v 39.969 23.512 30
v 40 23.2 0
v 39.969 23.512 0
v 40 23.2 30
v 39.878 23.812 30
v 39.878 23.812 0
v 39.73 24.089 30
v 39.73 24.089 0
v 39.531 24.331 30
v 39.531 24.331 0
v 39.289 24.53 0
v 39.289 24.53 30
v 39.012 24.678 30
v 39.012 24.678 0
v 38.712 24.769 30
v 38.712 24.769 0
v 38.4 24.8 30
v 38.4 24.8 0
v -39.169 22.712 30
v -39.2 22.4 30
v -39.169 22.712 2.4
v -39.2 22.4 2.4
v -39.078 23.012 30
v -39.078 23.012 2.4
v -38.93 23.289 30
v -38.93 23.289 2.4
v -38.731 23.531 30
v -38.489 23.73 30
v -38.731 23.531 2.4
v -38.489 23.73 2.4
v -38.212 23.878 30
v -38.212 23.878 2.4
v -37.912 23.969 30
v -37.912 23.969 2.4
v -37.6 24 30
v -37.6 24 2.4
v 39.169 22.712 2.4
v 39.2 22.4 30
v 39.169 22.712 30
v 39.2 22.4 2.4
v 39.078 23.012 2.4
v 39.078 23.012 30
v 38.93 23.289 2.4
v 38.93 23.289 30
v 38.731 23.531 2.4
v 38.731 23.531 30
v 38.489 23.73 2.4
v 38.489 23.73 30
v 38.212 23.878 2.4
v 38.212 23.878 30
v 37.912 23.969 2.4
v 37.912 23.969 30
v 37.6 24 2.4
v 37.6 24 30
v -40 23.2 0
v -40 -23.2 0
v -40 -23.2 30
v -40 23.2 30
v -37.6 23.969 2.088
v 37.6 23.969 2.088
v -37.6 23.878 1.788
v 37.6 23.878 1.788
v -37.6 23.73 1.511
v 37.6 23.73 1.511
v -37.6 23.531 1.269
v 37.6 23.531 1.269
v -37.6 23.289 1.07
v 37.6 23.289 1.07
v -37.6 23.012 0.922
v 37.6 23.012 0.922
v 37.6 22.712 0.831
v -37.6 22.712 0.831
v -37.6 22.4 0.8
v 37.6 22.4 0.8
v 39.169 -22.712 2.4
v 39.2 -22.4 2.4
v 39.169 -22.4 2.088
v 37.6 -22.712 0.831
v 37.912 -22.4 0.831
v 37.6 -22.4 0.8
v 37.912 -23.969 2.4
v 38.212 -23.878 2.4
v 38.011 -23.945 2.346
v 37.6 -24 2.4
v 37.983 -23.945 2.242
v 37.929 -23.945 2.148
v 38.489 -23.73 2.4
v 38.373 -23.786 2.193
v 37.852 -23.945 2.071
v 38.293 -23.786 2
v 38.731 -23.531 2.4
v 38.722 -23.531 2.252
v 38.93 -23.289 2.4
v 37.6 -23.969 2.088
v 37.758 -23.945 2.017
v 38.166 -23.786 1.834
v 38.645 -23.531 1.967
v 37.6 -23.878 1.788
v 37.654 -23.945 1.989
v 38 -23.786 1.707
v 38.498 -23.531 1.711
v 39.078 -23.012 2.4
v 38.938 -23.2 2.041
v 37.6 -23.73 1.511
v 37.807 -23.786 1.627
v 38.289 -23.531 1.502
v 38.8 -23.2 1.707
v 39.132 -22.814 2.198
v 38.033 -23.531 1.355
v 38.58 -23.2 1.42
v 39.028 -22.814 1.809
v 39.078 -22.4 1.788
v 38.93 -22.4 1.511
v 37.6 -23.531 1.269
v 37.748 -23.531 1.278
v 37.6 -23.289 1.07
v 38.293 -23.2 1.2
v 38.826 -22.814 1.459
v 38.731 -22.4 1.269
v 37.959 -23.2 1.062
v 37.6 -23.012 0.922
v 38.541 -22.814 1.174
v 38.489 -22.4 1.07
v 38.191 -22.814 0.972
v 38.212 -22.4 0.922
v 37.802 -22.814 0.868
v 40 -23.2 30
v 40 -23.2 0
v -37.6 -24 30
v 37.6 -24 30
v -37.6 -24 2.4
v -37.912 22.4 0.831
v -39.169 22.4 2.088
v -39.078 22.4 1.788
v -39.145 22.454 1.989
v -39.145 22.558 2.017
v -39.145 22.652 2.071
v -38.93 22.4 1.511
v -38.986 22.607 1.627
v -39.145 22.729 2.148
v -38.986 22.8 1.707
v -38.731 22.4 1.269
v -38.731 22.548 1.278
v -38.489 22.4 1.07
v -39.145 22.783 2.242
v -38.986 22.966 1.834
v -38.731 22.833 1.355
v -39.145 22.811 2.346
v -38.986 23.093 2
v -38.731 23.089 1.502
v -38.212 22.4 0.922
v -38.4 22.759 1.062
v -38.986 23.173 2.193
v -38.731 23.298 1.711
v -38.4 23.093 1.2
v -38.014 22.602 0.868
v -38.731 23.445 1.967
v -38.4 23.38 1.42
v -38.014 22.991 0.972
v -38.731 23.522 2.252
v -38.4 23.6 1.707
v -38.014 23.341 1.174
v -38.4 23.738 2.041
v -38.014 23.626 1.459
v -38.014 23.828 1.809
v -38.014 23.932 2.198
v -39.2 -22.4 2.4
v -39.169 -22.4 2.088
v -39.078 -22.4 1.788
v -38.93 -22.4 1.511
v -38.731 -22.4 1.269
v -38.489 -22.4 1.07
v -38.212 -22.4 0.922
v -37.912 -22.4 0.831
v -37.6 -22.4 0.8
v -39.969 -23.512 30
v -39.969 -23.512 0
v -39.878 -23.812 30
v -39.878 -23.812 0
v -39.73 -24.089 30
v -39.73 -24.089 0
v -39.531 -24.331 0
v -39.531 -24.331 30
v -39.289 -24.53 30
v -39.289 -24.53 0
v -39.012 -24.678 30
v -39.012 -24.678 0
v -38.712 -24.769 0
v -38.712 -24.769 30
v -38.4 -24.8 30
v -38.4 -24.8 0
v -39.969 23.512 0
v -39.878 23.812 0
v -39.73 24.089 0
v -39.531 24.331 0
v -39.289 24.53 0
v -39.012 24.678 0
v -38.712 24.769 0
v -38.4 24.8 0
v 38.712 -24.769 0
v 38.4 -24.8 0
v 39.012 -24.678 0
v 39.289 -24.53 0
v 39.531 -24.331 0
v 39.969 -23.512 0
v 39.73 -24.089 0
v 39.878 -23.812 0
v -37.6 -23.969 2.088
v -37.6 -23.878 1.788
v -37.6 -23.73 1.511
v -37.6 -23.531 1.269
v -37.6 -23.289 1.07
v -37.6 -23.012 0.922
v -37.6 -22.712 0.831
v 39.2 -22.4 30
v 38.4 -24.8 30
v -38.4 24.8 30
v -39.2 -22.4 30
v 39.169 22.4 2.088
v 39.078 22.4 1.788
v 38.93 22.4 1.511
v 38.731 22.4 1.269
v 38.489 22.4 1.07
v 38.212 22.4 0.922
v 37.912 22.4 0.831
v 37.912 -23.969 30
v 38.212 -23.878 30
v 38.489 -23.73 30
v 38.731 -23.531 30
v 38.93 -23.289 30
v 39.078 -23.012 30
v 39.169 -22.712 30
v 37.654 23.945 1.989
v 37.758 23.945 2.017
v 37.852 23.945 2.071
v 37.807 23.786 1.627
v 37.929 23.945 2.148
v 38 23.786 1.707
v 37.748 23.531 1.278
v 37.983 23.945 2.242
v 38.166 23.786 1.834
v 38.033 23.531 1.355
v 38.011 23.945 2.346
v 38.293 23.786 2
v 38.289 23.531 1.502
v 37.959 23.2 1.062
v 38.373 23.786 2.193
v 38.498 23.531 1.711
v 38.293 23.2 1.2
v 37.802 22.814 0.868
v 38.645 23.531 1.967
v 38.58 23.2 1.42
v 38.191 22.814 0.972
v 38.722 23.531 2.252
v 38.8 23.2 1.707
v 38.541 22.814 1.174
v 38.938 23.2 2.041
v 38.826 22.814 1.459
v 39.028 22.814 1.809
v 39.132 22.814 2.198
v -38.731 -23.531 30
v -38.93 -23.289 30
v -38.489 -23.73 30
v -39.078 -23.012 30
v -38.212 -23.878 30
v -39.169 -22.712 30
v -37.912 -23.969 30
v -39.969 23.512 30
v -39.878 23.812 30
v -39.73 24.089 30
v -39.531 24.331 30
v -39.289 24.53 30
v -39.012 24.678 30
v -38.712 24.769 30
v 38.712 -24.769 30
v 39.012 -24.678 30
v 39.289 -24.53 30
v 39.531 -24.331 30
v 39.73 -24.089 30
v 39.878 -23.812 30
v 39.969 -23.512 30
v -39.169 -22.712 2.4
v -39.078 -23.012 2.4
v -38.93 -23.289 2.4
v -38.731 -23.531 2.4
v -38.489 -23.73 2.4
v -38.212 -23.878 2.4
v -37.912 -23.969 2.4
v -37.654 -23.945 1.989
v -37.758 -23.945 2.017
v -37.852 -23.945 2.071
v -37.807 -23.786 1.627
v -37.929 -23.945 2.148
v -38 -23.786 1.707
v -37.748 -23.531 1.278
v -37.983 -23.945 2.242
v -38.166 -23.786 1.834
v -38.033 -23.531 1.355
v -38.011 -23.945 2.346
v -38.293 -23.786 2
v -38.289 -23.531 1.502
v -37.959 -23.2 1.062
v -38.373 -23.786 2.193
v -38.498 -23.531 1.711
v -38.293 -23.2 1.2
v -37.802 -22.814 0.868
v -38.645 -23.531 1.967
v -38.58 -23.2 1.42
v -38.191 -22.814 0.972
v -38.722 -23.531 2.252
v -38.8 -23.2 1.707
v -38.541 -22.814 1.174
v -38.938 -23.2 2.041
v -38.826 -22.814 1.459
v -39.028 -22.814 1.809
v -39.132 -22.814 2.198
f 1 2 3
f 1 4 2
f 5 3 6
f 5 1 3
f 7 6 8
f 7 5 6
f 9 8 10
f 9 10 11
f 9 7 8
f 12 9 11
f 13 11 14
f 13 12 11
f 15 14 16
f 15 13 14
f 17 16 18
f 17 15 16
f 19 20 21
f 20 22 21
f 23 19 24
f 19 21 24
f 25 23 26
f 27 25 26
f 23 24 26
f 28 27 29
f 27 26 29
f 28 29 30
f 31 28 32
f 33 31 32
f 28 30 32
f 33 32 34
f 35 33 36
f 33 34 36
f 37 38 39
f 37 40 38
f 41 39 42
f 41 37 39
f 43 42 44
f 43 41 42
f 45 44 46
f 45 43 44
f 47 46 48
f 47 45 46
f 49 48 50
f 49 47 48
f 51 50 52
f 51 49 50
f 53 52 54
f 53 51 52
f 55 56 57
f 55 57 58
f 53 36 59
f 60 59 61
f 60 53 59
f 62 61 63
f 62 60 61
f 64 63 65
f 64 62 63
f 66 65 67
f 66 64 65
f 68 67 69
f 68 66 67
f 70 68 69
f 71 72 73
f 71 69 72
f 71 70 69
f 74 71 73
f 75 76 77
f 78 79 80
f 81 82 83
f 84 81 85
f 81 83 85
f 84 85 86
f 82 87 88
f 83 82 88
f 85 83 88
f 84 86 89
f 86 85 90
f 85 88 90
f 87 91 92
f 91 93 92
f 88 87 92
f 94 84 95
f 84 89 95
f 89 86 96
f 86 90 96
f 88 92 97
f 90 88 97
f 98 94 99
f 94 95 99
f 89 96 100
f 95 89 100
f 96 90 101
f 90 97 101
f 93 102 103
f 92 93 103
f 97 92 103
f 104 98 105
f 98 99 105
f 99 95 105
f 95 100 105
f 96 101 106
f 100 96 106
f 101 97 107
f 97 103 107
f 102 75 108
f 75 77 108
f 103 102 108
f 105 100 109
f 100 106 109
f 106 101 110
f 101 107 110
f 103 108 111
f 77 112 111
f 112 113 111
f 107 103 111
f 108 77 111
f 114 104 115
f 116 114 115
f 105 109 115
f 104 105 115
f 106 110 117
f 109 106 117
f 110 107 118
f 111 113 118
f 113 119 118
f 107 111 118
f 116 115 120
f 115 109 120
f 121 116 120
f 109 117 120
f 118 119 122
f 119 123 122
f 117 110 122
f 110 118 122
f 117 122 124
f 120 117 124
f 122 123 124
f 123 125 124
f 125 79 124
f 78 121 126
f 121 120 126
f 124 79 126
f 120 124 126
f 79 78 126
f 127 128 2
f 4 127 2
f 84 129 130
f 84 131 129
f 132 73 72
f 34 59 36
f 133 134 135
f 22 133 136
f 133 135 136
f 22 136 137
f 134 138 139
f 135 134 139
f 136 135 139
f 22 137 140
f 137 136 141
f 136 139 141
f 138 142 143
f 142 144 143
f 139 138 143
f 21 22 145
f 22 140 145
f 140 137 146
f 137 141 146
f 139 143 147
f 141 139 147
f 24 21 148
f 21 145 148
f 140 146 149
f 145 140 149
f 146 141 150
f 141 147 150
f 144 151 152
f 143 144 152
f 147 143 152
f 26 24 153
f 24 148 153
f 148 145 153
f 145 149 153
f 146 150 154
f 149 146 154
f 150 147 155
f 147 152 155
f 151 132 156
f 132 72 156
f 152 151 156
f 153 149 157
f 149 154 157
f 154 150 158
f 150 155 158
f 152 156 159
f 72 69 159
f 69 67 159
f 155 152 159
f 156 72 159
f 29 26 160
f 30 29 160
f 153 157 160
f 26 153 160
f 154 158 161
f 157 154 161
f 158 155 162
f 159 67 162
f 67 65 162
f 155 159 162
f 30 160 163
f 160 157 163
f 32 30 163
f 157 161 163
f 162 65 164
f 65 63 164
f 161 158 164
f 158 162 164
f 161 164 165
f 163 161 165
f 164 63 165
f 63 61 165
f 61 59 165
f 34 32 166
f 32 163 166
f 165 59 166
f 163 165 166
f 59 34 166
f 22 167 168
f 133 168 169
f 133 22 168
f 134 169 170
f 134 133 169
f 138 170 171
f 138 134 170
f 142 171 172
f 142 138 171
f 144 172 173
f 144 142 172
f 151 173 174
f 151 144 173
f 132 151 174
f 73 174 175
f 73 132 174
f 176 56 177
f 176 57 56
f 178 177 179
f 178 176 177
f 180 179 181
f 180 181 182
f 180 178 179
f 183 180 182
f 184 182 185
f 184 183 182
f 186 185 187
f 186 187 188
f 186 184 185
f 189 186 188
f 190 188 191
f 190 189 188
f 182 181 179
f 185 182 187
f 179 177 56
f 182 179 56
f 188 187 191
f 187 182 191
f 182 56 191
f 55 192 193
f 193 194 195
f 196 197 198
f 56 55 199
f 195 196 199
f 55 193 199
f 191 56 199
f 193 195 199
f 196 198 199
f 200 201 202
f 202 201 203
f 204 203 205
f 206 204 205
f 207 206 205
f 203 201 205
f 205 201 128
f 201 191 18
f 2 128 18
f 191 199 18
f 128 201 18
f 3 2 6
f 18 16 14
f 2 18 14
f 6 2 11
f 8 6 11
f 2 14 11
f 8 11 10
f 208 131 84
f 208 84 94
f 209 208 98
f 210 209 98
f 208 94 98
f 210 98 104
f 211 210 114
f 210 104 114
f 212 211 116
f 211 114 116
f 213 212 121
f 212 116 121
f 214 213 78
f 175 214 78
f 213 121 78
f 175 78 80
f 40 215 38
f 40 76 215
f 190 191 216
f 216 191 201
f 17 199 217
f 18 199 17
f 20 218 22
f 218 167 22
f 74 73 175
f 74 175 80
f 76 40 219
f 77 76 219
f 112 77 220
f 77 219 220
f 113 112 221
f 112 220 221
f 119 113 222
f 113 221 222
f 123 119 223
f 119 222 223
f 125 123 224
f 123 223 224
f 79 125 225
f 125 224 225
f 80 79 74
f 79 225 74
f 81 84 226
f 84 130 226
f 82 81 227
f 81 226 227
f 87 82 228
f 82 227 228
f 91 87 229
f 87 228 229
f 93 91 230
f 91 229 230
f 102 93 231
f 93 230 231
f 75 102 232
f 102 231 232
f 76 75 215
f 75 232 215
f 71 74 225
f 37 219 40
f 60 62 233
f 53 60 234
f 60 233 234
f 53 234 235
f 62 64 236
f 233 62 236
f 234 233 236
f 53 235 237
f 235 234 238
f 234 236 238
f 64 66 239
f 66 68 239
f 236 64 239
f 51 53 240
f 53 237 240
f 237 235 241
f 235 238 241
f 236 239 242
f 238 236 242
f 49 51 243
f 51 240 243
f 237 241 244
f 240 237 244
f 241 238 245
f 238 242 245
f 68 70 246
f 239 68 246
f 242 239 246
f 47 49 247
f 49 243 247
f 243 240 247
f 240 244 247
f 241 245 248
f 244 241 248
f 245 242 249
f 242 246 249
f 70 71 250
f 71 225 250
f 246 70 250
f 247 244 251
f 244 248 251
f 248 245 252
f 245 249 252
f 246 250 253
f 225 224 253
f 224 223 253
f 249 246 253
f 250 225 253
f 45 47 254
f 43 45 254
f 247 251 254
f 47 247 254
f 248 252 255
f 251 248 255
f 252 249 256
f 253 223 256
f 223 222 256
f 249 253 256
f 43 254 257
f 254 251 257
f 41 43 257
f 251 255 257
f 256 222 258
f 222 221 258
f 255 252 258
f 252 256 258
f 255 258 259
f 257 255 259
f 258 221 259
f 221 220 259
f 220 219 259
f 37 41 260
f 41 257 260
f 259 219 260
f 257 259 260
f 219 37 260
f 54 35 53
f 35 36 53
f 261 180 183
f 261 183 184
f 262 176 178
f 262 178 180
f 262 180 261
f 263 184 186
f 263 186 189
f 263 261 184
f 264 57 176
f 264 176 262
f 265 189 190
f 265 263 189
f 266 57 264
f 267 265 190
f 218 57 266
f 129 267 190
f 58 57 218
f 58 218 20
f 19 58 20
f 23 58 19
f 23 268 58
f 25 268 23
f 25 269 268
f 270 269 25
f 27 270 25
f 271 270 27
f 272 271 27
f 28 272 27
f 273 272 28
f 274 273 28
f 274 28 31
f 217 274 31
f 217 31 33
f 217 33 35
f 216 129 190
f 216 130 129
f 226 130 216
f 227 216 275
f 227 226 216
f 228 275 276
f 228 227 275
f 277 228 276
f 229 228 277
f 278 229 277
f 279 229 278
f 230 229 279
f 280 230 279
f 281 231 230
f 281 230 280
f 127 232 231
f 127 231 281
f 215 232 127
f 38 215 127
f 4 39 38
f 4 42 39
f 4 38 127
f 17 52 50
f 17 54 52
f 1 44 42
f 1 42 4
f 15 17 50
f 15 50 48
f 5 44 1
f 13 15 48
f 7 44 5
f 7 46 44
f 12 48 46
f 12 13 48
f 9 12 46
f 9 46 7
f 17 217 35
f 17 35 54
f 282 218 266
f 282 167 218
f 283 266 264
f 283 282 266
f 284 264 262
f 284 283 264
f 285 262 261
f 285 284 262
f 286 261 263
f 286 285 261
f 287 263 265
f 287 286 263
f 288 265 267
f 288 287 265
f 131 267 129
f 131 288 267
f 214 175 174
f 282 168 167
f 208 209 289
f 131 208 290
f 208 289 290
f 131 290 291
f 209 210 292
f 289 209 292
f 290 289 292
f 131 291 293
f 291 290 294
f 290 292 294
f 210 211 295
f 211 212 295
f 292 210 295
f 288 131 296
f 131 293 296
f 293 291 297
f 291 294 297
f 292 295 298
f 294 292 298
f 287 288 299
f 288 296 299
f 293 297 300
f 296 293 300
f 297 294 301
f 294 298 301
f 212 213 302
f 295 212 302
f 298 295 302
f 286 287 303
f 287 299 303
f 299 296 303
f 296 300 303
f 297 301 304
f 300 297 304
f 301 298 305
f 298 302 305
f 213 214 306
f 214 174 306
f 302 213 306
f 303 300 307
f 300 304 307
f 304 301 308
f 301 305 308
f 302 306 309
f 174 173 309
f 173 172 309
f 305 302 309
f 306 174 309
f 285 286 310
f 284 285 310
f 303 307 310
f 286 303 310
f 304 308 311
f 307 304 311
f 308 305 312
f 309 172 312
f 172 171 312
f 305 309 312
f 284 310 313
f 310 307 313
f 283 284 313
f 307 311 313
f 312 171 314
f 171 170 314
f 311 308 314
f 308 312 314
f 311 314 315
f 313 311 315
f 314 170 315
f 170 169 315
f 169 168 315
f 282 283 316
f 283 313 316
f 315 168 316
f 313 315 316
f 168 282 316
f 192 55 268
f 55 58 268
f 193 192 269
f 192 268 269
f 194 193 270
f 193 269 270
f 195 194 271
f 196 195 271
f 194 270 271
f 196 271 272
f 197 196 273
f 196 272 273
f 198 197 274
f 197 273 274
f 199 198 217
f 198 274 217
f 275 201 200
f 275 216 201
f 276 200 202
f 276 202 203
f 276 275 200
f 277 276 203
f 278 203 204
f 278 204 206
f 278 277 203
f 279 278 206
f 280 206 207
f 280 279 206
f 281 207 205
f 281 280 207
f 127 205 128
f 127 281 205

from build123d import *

# Parameters (mm, degrees)
ESQUISSE1_W        = 80
ESQUISSE1_H        = 49.6
BOSS_EXTRU_1_DEPTH = 30
COQUE1_T           = -0.8
CONG_1_R           = 1.6


with BuildPart() as part:
    # Esquisse1 → Boss.-Extru.1 (new body)
    with BuildSketch(Plane.XY):
        Rectangle(ESQUISSE1_W, ESQUISSE1_H)
    extrude(amount=BOSS_EXTRU_1_DEPTH)

    # Coque1
    coque1_openings = [part.faces().sort_by_distance(p)[0] for p in [
        (0, 0, 30),
    ]]
    offset(amount=COQUE1_T, openings=coque1_openings, kind=Kind.INTERSECTION)

    # Congé1
    cong_1_edges = [part.edges().sort_by_distance(p)[0] for p in [
        (39.2, 0, 0.8),
        (39.2, -24, 15.4),
        (0, 24, 0.8),
        (39.2, 24, 15.4),
        (-39.2, 0, 0.8),
        (-39.2, 24, 15.4),
        (0, -24, 0.8),
        (-39.2, -24, 15.4),
        (40, -24.8, 15),
        (-40, -24.8, 15),
        (-40, 24.8, 15),
        (40, 24.8, 15),
    ]]
    fillet(cong_1_edges, radius=CONG_1_R)


solid = part.part
